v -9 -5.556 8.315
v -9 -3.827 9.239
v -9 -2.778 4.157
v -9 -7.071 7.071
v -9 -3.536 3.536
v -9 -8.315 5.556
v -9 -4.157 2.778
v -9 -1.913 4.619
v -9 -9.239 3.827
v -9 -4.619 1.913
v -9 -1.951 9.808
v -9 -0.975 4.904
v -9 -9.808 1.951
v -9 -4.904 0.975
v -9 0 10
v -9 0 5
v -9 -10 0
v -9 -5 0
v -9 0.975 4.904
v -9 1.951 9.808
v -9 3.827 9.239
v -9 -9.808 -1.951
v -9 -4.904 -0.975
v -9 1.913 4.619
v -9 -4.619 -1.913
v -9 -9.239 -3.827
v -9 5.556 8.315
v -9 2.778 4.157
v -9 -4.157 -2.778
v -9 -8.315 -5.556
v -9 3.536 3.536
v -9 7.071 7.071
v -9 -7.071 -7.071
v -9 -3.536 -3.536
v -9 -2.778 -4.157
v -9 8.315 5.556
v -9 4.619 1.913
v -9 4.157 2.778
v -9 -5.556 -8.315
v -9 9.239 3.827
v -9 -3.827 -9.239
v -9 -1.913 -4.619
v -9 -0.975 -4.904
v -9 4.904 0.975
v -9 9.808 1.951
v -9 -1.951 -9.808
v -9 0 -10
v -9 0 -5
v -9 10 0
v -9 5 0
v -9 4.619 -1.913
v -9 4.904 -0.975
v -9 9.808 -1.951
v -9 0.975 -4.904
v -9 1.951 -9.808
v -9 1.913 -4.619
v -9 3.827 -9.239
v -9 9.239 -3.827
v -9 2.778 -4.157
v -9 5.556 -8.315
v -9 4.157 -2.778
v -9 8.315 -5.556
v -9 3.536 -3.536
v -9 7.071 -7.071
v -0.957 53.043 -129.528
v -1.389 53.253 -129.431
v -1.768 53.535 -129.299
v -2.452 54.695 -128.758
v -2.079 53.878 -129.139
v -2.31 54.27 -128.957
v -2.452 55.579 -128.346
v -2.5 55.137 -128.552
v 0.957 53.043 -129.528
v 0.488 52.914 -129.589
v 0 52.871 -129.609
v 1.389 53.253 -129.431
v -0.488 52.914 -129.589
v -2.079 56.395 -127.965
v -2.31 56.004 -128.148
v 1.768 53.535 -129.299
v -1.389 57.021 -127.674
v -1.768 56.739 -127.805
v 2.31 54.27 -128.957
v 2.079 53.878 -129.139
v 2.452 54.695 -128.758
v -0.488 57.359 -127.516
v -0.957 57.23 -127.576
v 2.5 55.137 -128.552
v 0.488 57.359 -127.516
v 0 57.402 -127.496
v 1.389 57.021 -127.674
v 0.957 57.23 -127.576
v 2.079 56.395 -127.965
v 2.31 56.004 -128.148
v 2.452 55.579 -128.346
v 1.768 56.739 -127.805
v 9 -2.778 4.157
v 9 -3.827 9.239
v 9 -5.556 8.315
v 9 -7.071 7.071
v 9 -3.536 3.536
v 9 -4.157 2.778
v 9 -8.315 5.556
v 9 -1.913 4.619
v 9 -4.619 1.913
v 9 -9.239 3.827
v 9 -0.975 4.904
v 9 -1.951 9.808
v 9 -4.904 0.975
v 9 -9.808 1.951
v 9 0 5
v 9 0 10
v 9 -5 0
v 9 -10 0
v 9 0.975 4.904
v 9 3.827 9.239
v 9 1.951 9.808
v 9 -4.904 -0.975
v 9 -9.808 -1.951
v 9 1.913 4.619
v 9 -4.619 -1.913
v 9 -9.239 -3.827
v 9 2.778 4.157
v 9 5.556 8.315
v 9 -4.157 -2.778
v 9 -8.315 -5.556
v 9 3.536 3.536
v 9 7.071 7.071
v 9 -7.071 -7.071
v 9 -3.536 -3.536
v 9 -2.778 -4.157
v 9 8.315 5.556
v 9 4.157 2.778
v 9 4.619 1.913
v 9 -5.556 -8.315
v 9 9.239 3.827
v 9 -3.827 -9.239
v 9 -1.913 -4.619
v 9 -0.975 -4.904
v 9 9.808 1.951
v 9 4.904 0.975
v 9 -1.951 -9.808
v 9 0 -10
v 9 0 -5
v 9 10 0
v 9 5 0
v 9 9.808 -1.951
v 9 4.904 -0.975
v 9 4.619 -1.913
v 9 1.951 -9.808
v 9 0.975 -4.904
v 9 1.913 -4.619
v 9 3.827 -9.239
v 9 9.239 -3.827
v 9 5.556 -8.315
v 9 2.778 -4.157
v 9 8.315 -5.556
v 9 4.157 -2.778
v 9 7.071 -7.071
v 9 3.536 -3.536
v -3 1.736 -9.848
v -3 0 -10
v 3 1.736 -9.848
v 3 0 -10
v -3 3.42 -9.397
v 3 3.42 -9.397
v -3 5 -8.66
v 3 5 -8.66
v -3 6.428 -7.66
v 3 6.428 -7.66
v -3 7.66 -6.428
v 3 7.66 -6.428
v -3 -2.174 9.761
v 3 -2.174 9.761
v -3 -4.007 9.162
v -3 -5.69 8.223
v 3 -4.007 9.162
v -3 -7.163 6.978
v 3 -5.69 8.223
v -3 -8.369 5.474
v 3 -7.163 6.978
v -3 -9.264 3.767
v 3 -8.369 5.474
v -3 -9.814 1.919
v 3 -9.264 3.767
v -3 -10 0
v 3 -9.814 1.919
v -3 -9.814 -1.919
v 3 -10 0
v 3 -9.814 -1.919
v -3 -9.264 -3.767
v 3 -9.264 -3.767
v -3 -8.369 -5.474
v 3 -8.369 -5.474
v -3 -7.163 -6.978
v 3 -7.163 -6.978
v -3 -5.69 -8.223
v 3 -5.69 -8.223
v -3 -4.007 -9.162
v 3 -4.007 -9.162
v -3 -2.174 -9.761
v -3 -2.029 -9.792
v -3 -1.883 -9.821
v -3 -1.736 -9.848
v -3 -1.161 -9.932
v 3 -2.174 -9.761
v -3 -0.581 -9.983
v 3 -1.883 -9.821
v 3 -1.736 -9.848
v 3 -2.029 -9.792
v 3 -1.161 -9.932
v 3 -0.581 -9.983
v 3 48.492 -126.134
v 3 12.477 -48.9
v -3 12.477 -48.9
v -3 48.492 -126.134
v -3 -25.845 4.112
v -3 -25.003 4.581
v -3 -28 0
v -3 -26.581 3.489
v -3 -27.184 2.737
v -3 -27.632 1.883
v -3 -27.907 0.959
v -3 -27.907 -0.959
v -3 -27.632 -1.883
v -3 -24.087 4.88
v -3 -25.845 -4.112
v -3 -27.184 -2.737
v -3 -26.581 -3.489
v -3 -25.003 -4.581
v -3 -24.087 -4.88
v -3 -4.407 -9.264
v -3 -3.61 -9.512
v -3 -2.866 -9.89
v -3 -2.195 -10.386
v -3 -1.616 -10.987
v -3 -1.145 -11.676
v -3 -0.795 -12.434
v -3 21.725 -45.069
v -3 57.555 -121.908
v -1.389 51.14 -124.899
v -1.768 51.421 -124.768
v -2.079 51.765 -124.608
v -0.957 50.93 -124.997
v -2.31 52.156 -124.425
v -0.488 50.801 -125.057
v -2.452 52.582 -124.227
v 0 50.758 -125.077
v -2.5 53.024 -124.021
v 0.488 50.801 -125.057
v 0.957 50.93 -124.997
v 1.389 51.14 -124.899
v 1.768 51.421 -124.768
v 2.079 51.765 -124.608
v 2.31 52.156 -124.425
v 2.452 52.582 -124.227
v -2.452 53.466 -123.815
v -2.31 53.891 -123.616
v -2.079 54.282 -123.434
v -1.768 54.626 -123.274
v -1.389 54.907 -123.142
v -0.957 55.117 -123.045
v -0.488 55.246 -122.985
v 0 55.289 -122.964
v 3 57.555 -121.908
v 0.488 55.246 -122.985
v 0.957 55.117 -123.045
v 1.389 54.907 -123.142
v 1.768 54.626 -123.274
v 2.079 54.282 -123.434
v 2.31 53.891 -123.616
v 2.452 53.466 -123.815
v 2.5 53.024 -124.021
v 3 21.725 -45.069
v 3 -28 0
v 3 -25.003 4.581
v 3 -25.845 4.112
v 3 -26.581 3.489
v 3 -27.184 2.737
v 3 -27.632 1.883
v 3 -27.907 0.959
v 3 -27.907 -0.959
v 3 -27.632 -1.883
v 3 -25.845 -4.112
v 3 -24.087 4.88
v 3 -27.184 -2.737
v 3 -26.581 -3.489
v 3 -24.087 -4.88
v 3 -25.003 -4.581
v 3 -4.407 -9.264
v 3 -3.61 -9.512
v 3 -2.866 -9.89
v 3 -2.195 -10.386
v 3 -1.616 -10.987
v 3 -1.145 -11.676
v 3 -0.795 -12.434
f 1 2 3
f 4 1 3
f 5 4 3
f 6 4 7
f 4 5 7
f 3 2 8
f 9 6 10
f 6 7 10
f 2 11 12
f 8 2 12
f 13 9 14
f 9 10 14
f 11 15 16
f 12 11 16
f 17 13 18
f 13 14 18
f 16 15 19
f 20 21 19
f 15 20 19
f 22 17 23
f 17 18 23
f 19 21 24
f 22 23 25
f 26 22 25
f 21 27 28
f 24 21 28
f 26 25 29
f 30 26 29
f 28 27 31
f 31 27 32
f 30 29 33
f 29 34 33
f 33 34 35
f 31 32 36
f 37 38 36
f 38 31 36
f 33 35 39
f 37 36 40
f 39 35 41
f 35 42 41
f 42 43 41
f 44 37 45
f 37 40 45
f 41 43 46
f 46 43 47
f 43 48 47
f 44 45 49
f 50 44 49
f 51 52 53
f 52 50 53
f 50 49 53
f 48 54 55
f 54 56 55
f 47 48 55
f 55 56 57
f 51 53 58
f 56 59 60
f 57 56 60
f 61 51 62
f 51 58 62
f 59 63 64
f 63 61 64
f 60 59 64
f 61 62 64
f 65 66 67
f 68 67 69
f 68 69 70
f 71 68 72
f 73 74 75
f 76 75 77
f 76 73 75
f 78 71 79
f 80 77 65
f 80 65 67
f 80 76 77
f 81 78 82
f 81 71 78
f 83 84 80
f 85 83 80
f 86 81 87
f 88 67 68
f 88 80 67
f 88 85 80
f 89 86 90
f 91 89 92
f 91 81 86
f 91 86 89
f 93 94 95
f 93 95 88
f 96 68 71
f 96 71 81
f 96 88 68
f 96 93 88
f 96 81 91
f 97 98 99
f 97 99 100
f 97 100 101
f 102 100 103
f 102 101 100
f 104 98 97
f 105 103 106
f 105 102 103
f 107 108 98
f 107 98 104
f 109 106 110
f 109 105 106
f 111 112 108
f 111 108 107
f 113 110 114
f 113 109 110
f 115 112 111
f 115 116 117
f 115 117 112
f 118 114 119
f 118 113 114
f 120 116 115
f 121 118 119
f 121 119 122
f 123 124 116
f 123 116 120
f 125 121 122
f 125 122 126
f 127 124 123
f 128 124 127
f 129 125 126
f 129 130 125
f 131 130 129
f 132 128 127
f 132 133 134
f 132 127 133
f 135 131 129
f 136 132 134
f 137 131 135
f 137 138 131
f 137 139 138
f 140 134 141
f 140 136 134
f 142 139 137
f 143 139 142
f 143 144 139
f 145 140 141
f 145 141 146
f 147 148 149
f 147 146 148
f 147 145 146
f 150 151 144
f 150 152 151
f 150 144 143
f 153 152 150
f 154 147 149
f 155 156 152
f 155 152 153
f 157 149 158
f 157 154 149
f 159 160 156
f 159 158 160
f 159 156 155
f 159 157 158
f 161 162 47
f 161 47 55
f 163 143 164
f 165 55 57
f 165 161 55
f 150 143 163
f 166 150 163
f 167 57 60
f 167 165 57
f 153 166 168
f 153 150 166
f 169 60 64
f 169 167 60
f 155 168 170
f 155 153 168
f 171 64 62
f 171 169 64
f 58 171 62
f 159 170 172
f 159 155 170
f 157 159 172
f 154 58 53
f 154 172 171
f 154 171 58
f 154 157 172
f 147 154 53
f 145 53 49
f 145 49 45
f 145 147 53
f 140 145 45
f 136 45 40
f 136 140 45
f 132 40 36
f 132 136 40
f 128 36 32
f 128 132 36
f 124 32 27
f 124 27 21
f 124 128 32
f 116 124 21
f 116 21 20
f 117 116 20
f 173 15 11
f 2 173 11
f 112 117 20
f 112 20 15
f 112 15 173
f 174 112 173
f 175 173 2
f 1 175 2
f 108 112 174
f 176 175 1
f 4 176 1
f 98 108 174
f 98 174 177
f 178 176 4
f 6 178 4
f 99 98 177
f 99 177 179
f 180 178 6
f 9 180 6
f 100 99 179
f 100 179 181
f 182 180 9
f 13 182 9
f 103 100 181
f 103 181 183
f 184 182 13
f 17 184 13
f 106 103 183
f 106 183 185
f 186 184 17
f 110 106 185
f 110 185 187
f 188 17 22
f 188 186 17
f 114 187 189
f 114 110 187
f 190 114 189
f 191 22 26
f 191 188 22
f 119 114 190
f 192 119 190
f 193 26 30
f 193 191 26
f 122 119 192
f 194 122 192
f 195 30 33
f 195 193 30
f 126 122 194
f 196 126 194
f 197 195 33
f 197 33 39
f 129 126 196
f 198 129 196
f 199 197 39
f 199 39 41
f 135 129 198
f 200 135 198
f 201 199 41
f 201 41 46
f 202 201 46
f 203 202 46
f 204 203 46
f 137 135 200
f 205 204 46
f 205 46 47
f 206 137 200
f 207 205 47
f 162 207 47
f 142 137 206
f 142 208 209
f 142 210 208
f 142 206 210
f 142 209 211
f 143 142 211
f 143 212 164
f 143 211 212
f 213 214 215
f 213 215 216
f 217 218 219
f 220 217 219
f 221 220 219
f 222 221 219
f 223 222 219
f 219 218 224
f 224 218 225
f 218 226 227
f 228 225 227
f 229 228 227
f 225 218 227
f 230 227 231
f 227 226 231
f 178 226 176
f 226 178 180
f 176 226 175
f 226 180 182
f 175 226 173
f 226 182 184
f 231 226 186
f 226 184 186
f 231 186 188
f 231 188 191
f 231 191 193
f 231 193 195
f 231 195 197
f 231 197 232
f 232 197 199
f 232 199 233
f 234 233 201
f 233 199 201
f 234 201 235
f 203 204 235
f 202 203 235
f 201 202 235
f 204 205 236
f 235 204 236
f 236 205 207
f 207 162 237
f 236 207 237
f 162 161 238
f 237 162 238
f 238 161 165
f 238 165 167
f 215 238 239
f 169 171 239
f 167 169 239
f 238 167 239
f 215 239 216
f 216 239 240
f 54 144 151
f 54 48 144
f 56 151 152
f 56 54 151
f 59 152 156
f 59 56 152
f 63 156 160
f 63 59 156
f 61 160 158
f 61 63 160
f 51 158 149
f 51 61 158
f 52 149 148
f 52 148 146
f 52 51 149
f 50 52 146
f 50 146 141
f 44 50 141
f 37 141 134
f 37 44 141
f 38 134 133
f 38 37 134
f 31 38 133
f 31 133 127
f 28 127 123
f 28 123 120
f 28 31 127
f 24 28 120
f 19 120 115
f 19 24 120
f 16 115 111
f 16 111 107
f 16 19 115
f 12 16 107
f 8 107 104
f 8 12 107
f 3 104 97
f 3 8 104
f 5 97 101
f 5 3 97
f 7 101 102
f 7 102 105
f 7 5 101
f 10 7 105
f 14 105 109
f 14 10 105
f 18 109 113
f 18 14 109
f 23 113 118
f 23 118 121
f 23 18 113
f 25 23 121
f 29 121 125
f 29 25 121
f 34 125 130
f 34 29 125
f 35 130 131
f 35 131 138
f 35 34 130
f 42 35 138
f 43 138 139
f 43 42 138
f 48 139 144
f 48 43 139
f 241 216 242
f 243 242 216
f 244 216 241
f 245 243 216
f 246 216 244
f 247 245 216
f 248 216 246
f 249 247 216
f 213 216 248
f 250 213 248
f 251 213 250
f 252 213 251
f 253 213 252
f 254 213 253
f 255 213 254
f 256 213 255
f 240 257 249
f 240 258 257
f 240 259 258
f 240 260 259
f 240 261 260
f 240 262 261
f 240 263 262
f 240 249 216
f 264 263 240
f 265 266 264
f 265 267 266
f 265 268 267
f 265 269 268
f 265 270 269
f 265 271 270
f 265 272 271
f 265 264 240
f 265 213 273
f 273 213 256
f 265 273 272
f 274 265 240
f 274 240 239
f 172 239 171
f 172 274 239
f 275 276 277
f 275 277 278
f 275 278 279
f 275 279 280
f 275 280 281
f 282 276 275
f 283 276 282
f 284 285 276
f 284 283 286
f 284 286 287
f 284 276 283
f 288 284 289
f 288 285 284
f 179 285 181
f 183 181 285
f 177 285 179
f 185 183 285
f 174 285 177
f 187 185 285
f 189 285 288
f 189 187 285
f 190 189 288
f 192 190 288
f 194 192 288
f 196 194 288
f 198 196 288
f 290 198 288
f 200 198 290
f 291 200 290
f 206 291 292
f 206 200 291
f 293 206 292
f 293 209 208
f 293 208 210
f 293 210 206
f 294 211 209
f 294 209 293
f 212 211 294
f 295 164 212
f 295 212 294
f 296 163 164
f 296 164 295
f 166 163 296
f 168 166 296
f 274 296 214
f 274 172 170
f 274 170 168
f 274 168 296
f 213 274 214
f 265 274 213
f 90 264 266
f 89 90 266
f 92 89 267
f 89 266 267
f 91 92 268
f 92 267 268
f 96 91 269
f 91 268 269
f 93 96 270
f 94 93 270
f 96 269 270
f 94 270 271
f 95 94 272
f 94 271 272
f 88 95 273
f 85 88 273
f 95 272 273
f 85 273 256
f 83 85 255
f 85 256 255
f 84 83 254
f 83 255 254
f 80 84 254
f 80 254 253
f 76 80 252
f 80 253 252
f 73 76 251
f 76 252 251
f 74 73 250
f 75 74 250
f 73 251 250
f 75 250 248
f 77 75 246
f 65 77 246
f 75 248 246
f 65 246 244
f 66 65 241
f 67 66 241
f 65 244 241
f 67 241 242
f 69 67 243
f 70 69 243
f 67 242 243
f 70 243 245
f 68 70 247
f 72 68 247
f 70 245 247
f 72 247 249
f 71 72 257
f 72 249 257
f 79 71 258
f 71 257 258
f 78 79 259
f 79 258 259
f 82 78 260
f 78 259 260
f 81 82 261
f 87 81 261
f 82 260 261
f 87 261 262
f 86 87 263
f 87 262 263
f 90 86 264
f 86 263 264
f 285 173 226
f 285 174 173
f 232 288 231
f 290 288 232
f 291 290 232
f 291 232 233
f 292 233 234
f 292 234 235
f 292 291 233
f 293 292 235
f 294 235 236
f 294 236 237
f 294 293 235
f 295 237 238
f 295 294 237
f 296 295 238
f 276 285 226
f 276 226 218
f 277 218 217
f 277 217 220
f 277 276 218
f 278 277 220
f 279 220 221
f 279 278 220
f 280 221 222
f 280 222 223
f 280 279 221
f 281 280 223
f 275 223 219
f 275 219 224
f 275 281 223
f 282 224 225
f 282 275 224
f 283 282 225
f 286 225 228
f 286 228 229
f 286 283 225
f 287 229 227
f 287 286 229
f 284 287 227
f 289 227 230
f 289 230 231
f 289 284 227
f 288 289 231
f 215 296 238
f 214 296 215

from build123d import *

# Parameters (mm, degrees)
SKETCH_1_R      = 10
SKETCH_1_R_2    = 5
EXTRUDE_1_DEPTH = 9
EXTRUDE_2_DEPTH = 3
EXTRUDE_3_DEPTH = 3
EXTRUDE_4_DEPTH = 3
SKETCH_5_R      = 2.5
EXTRUDE_5_DEPTH = 5


with BuildPart() as part:
    # 草图1 → 凸台-拉伸1 (new, symmetric)
    with BuildSketch(Plane(origin=(0, 0, 0), x_dir=(0, 0, -1), z_dir=(1, 0, 0))):
        Circle(SKETCH_1_R)
        Circle(SKETCH_1_R_2, mode=Mode.SUBTRACT)
    extrude(amount=EXTRUDE_1_DEPTH, both=True)

    # 草图2 → 凸台-拉伸2 (add, symmetric)
    with BuildSketch(Plane(origin=(0, 0, 0), x_dir=(0, 0, -1), z_dir=(1, 0, 0))):
        with BuildLine():
            Line((9.84807753, -1.736481777), (48.899871085, 12.477208672))
            Line((48.899871085, 12.477208672), (126.133884246, 48.492020479))
            Line((126.133884246, 48.492020479), (121.907701629, 57.555098349))
            Line((121.907701629, 57.555098349), (45.069390993, 21.72480566))
            Line((45.069390993, 21.72480566), (6.427876097, 7.660444431))
            ThreePointArc((6.427876097, 7.660444431), (9.396926208, 3.420201433), (9.84807753, -1.736481777))
        make_face()
    extrude(amount=EXTRUDE_2_DEPTH, both=True)

    # 草图3 → 凸台-拉伸3 (add, symmetric)
    with BuildSketch(Plane(origin=(0, 0, 0), x_dir=(0, 0, -1), z_dir=(1, 0, 0))):
        with BuildLine():
            Line((-9.760845357, -2.173913043), (-4.880422678, -24.086956522))
            ThreePointArc((-4.880422678, -24.086956522), (0, -28), (4.880422678, -24.086956522))
            Line((4.880422678, -24.086956522), (9.760845357, -2.173913043))
            ThreePointArc((9.760845357, -2.173913043), (0, -10), (-9.760845357, -2.173913043))
        make_face()
    extrude(amount=EXTRUDE_3_DEPTH, both=True)

    # 草图4 → 凸台-拉伸4 (add, symmetric)
    with BuildSketch(Plane(origin=(0, 0, 0), x_dir=(0, 0, -1), z_dir=(1, 0, 0))):
        with BuildLine():
            Line((9.760845357, -2.173913043), (9.26353243, -4.406842549))
            ThreePointArc((9.26353243, -4.406842549), (10.386363512, -2.195237961), (12.433854391, -0.795335967))
            Line((12.433854391, -0.795335967), (9.84807753, -1.736481777))
            ThreePointArc((9.84807753, -1.736481777), (9.806900669, -1.955683838), (9.760845357, -2.173913043))
        make_face()
    extrude(amount=EXTRUDE_4_DEPTH, both=True)

    # 草图5 → 凸台-拉伸5 (add)
    with BuildSketch(Plane(origin=(0, 56.973055831, -122.179112512), x_dir=(-1, 0, 0), z_dir=(0, 0.422618261740695, -0.9063077870366522))):
        with Locations(Location((0, -4.357787137, 0), (0, 0, 90))):
            Circle(SKETCH_5_R)
    extrude(amount=EXTRUDE_5_DEPTH)


solid = part.part
